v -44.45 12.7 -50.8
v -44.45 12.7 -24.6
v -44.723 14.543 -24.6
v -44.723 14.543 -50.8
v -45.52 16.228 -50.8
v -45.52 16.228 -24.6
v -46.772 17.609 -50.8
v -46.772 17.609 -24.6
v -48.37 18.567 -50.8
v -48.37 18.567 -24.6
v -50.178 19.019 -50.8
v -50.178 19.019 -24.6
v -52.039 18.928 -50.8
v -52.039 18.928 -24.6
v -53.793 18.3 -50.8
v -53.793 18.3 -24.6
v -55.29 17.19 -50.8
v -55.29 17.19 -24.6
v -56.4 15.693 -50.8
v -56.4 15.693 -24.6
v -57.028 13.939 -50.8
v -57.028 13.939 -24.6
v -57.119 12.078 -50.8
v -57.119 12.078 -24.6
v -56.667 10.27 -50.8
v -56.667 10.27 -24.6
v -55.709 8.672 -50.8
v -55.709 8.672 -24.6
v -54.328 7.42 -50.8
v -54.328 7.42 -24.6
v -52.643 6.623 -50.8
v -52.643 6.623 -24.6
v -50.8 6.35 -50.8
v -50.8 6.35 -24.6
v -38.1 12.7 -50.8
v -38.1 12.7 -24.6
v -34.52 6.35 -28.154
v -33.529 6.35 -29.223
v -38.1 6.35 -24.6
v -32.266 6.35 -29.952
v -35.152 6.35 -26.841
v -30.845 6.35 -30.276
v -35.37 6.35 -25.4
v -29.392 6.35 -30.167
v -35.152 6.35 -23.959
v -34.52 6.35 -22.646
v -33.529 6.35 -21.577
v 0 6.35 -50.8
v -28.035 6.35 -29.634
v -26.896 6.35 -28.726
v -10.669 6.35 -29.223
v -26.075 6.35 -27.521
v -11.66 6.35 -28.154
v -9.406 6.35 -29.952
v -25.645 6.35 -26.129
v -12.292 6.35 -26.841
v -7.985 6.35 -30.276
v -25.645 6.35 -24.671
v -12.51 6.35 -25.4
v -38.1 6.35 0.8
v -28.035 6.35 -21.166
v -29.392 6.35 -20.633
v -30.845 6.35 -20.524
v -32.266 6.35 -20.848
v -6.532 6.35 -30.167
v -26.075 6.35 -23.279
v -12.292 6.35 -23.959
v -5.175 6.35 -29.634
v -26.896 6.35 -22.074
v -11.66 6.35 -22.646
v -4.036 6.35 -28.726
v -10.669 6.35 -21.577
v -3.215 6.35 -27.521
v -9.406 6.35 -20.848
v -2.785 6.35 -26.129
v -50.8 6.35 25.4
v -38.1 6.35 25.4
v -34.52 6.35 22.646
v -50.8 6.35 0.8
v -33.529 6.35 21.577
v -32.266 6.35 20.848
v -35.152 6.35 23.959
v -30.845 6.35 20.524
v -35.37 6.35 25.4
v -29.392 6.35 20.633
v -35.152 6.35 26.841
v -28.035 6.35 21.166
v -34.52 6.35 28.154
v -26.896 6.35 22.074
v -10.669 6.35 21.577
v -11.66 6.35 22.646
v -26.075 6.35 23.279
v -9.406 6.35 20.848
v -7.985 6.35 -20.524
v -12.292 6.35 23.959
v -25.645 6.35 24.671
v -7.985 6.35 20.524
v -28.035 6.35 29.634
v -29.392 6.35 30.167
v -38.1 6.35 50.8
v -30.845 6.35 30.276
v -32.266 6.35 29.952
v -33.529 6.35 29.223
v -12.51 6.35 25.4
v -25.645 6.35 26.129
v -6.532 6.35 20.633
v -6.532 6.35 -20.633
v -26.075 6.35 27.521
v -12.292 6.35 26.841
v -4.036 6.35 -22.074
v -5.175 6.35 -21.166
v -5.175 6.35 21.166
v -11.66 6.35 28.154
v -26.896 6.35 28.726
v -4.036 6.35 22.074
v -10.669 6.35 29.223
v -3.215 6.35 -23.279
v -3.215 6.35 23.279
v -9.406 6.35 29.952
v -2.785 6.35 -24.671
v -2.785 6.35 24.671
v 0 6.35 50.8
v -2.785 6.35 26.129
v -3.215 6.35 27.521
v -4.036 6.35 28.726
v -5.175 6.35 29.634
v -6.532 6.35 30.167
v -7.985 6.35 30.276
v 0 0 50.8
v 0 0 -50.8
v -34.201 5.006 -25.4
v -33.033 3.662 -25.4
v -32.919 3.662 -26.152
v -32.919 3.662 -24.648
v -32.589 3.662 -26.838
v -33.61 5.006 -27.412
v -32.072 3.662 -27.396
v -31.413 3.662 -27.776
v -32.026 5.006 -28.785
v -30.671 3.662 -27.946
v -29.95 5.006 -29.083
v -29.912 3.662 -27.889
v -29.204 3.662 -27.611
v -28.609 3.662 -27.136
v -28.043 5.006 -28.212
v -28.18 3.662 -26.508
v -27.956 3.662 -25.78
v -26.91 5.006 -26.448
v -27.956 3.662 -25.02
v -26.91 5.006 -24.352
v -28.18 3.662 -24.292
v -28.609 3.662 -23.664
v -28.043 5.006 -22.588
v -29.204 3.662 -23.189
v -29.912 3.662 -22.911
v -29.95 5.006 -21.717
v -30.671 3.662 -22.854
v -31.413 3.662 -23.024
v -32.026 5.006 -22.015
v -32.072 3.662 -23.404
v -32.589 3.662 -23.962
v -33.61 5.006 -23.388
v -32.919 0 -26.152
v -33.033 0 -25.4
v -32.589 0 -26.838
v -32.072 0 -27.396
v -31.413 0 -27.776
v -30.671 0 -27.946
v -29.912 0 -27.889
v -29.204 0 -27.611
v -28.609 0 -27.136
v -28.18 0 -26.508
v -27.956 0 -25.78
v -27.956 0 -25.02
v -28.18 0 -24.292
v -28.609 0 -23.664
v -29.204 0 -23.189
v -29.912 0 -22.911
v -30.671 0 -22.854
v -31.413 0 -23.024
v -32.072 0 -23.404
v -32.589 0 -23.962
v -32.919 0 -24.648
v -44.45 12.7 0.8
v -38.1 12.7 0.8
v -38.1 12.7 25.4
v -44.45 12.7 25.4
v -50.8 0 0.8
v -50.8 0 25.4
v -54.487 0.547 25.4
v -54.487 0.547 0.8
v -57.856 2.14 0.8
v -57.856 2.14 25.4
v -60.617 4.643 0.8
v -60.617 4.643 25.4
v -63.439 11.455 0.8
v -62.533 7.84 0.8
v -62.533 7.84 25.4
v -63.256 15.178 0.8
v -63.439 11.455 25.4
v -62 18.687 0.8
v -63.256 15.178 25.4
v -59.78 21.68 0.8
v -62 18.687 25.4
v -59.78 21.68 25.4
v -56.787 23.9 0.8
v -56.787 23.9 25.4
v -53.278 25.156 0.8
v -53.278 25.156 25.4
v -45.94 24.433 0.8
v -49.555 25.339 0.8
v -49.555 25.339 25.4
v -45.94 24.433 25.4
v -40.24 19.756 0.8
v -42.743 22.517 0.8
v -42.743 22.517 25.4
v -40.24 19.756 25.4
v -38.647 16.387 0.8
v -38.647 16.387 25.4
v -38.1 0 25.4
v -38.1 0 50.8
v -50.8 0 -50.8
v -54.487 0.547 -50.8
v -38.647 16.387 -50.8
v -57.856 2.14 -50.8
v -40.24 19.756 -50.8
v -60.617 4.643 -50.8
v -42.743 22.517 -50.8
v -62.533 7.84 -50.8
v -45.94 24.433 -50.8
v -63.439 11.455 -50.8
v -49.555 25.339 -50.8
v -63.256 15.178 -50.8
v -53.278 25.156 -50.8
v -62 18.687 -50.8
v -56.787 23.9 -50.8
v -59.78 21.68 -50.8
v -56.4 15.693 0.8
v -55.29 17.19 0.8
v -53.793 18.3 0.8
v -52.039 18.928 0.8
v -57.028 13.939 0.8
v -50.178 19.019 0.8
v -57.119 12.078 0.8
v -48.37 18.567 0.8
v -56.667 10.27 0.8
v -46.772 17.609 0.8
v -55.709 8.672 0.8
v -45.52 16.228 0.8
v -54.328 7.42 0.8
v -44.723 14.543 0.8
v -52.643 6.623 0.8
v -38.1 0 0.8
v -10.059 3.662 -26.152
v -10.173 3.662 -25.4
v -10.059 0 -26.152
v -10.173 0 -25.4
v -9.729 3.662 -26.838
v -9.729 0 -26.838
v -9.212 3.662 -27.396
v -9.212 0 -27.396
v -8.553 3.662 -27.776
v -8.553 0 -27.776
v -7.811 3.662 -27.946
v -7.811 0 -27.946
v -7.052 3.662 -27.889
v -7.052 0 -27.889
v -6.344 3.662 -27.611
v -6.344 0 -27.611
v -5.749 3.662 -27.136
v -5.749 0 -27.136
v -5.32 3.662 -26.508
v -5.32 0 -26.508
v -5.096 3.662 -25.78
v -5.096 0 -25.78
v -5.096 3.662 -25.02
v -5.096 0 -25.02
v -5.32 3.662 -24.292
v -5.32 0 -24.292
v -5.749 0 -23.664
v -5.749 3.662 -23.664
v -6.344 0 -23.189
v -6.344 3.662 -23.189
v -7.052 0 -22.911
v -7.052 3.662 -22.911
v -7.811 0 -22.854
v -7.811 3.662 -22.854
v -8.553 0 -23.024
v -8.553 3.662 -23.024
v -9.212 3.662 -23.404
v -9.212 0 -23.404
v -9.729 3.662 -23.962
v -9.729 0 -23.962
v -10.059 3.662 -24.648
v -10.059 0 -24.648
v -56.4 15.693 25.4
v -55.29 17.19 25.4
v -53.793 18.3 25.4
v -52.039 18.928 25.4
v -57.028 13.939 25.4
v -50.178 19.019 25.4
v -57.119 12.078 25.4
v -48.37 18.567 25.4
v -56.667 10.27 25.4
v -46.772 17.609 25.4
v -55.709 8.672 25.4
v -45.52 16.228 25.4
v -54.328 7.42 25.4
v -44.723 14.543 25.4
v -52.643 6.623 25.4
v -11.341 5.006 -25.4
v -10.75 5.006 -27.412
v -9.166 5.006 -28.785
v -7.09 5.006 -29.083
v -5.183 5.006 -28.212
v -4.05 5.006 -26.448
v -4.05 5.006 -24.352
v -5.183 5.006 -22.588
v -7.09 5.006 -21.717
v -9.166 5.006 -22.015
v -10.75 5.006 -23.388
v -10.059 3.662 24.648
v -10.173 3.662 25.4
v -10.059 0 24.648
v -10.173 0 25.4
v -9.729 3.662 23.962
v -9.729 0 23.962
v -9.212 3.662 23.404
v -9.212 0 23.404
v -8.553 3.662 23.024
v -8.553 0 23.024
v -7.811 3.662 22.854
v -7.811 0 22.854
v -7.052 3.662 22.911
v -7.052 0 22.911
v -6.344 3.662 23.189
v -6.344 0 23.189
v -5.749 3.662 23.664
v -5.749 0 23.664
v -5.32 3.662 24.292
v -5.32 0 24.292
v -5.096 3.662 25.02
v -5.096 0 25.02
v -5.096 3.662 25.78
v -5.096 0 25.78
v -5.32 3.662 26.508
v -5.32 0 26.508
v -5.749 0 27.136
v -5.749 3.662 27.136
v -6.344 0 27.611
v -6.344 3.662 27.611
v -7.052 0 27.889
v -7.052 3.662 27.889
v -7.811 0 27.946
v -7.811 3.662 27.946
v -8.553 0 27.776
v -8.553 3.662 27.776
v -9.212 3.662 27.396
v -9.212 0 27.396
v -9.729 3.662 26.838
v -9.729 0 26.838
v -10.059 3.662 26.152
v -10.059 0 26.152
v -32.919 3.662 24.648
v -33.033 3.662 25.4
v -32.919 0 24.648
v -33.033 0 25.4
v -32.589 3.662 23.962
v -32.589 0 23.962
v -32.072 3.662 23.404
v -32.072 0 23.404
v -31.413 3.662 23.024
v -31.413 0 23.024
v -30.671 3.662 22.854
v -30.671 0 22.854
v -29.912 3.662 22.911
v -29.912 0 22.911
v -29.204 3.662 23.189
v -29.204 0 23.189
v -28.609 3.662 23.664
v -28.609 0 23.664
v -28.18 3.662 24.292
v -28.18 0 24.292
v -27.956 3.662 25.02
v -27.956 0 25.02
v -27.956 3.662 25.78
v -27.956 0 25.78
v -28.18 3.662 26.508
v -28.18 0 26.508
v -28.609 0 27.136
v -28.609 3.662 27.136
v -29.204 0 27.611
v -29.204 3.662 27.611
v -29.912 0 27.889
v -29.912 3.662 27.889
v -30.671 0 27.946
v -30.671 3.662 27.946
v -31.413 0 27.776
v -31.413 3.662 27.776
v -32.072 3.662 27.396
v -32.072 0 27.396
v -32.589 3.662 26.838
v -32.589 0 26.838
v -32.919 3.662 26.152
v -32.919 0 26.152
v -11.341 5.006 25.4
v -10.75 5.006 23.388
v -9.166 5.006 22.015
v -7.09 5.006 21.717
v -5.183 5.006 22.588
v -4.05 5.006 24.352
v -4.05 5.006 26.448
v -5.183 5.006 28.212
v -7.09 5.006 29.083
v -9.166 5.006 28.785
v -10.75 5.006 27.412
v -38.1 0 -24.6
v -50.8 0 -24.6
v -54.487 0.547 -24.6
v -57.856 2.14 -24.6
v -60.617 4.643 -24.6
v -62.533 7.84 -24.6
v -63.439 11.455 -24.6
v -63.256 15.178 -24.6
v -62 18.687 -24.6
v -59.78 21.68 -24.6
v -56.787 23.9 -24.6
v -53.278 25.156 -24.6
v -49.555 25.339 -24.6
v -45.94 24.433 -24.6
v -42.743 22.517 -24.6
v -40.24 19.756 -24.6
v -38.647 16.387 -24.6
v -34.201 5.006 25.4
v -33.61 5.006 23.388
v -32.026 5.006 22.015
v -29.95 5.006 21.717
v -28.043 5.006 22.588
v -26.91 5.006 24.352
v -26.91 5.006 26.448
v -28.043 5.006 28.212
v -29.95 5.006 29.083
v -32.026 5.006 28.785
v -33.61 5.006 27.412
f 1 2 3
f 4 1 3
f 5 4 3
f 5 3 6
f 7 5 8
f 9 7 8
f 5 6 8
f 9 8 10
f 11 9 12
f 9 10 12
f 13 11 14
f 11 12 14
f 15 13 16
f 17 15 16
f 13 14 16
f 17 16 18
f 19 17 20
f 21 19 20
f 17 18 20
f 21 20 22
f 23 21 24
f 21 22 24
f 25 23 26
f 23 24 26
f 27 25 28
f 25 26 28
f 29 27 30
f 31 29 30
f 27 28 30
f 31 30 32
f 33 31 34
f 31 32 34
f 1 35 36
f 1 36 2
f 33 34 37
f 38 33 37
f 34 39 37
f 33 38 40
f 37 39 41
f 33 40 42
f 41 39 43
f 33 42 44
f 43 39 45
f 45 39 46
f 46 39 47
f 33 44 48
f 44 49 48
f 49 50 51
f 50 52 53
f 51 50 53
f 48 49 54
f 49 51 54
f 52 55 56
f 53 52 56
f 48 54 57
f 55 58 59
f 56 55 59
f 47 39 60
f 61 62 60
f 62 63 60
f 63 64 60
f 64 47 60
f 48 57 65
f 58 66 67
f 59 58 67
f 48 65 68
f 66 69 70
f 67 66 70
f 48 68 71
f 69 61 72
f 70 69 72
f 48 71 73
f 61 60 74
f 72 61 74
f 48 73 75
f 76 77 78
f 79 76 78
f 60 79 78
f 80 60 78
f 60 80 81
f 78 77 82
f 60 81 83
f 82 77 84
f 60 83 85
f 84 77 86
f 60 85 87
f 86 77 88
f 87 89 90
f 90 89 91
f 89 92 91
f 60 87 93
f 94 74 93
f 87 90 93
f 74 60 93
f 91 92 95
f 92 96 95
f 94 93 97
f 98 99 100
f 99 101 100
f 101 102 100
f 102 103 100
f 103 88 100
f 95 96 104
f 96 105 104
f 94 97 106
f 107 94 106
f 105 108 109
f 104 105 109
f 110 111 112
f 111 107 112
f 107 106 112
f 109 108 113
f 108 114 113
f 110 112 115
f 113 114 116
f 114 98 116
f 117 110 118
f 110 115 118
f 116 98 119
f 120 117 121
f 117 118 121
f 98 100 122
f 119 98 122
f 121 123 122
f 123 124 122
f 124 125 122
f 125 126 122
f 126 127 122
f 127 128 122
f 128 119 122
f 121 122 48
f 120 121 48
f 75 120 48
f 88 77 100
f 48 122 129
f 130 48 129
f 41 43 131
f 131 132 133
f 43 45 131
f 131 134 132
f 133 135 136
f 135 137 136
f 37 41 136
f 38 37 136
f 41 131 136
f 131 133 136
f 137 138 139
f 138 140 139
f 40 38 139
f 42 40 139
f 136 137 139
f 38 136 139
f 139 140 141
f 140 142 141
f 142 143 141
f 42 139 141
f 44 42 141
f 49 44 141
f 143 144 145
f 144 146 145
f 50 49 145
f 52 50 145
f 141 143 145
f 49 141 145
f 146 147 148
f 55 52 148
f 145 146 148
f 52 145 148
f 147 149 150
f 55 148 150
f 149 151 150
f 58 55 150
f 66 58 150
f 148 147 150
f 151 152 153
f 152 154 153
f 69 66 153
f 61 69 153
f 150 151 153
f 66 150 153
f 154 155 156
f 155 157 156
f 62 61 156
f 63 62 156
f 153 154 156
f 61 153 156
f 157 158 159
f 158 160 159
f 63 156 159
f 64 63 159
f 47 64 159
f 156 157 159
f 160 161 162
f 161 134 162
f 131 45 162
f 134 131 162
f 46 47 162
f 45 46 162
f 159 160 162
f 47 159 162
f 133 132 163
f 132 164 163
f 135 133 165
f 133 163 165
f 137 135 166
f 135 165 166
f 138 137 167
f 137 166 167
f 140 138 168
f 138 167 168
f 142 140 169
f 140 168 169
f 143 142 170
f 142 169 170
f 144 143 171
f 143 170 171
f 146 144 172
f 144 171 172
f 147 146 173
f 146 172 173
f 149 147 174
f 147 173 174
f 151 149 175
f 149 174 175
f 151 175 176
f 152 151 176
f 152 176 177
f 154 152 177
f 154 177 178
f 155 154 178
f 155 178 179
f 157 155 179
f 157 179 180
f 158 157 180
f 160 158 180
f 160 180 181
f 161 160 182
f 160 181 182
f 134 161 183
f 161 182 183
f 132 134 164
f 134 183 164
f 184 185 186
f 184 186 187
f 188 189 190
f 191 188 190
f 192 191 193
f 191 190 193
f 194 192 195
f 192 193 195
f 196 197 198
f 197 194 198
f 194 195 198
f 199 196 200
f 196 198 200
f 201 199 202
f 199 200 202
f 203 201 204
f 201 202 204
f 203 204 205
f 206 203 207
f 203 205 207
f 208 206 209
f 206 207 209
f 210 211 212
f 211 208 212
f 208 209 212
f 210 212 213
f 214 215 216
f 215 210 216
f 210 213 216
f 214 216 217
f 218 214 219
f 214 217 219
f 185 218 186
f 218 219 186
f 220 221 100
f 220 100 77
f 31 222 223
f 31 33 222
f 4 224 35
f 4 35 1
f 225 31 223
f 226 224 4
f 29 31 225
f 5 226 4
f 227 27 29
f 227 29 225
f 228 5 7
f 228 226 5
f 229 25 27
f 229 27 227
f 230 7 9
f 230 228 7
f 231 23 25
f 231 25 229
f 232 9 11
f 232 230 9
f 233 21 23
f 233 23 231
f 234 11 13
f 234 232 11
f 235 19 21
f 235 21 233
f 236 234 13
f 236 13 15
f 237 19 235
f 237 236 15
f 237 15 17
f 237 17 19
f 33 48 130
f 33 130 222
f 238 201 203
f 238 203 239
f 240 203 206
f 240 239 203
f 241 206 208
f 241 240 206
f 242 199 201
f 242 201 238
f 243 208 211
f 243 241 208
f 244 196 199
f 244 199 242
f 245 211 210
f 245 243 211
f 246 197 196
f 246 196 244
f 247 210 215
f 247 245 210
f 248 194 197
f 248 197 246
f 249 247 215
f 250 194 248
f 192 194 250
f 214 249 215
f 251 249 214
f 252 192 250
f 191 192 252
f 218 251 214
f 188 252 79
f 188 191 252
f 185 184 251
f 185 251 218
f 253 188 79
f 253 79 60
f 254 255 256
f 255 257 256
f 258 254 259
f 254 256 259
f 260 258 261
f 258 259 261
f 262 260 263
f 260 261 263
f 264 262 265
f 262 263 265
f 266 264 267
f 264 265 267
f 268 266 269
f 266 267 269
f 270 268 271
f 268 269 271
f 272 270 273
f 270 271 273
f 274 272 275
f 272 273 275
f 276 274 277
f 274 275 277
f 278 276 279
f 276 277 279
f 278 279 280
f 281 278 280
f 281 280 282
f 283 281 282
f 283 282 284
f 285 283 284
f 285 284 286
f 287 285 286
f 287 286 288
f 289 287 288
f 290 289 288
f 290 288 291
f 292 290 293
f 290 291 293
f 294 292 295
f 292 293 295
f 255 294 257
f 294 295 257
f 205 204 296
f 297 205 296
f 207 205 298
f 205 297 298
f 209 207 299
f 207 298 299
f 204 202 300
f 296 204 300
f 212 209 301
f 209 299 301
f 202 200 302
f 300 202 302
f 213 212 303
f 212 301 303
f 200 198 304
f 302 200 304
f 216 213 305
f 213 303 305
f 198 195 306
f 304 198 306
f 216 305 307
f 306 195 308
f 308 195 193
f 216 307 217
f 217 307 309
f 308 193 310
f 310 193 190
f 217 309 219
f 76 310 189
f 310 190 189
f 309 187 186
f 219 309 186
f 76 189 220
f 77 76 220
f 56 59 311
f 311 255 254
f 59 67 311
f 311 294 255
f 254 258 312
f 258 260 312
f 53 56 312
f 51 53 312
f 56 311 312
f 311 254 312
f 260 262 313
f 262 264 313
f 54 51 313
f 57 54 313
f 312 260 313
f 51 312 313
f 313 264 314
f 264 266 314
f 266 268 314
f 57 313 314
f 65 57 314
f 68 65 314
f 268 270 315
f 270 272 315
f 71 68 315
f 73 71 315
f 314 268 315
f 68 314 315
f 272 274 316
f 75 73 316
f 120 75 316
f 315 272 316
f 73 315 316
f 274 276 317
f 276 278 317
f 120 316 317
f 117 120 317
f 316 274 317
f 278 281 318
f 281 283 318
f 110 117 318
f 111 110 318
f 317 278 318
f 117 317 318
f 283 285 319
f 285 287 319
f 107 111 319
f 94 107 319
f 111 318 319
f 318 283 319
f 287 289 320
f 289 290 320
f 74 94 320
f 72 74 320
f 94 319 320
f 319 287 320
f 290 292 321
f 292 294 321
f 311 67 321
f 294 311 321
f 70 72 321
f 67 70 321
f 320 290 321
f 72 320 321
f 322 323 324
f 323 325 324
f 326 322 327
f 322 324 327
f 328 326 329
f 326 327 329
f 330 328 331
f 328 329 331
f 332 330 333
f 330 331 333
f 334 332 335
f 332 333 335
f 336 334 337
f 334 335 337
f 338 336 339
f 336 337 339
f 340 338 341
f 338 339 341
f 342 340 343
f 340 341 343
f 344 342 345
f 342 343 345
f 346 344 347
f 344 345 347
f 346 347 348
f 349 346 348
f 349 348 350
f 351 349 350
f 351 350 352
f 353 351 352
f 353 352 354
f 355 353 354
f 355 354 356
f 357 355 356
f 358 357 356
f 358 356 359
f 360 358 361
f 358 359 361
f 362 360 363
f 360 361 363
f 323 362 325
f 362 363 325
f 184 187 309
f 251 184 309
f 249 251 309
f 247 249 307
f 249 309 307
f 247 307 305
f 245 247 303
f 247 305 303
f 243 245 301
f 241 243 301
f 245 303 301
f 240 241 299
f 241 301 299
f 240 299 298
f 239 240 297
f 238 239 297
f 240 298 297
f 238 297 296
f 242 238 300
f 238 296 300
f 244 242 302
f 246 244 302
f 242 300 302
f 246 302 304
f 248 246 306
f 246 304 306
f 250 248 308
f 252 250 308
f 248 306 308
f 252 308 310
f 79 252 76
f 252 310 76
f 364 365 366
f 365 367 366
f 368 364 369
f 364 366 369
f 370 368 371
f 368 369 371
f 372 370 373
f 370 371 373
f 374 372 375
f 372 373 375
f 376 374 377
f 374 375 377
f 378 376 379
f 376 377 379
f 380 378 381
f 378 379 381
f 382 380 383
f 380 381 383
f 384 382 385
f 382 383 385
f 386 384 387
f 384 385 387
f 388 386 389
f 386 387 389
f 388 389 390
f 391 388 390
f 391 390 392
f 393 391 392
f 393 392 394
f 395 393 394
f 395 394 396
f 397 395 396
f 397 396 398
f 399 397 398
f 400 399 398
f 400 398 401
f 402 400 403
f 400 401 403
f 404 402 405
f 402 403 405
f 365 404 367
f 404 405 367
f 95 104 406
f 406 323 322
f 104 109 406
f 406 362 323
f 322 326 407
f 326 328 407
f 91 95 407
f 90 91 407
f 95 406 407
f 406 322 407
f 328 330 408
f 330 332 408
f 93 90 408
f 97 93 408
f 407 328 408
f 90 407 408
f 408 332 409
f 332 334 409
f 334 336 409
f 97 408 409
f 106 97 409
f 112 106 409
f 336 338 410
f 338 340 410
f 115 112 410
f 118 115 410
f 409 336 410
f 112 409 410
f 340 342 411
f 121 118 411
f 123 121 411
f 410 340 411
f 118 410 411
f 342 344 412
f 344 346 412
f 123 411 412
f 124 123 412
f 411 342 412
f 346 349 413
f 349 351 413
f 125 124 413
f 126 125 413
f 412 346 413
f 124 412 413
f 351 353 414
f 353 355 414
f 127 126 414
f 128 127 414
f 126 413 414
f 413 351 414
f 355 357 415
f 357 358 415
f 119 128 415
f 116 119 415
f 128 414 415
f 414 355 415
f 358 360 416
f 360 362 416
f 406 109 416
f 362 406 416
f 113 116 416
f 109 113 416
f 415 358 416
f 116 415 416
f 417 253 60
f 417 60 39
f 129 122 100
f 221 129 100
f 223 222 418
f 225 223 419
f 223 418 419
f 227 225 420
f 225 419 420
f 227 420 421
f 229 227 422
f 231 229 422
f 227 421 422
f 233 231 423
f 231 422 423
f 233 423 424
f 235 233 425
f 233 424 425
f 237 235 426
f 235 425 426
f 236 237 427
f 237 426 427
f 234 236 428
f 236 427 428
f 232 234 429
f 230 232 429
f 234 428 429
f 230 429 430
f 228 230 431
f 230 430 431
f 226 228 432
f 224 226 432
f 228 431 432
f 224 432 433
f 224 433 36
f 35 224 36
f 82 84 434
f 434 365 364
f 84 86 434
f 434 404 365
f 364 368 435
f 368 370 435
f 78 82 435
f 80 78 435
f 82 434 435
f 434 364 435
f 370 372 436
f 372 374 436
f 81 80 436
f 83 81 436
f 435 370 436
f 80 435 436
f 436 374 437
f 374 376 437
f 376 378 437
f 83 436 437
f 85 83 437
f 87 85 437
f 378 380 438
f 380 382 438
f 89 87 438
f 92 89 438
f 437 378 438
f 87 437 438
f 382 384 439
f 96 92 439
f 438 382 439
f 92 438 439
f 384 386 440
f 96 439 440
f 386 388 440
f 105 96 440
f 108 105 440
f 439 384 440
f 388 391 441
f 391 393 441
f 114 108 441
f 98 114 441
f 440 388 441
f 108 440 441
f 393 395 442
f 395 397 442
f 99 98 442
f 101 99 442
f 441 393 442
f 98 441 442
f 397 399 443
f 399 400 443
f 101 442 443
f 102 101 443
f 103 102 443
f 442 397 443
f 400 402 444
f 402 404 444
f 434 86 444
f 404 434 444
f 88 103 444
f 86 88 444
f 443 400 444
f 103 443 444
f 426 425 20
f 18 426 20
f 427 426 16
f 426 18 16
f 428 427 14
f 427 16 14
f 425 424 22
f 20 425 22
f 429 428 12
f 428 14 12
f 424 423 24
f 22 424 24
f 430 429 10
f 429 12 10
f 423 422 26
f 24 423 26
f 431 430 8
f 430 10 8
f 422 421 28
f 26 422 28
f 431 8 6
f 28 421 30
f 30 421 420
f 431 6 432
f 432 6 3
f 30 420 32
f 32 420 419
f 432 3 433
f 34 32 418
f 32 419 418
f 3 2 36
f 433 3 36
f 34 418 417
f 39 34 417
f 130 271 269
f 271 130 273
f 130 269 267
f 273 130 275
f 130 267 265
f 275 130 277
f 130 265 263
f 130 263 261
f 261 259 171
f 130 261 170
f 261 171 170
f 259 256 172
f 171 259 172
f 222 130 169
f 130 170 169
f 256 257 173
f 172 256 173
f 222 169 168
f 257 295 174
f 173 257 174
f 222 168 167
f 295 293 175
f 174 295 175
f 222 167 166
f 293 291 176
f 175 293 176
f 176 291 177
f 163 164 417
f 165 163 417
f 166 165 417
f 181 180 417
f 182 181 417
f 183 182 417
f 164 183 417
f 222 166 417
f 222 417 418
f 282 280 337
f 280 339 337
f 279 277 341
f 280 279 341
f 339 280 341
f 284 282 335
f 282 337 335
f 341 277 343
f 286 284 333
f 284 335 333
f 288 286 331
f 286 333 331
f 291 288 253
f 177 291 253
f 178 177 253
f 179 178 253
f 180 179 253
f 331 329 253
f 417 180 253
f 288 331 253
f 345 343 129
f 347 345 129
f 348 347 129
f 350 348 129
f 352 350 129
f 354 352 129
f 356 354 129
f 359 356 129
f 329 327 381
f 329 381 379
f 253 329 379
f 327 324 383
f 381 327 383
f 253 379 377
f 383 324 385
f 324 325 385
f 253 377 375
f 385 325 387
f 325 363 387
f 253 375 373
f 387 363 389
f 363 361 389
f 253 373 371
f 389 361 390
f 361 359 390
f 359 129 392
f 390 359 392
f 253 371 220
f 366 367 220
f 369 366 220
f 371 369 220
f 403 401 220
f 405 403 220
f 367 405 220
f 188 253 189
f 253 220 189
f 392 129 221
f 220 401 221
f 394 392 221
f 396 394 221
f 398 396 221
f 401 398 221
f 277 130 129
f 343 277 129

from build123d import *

# Parameters (mm, degrees)
EXTRUDE_THIN1_DEPTH                             = 50.8
CUT_EXTRUDE2_START                              = -7.35
SKETCH3_W                                       = 25.4
SKETCH3_H                                       = 25.4
CUT_EXTRUDE2_DEPTH                              = 27.4
LPATTERN1_COUNT                                 = 2
LPATTERN1_PITCH                                 = 50
CSK_FOR_10_FLAT_HEAD_MACHINE_SCREW1_D           = 5.1054
CSK_FOR_10_FLAT_HEAD_MACHINE_SCREW1_CSINK_D     = 9.779
CSK_FOR_10_FLAT_HEAD_MACHINE_SCREW1_CSINK_ANGLE = 82
LPATTERN2_COUNT                                 = 2
LPATTERN2_PITCH                                 = 50.8
LPATTERN2_COUNT_DIR2                            = 2
LPATTERN2_PITCH_DIR2                            = 22.86


with BuildPart() as part:
    # Sketch1 → Extrude-Thin1 (new body, symmetric)
    with BuildSketch(Plane.XY):
        with BuildLine():
            Line((0, 0), (-50.8, 0))
            ThreePointArc((-50.8, 0), (-59.780256121, 21.680256121), (-38.1, 12.7))
            Line((-38.1, 12.7), (-44.45, 12.7))
            ThreePointArc((-44.45, 12.7), (-55.290128061, 17.190128061), (-50.8, 6.35))
            Line((-50.8, 6.35), (0, 6.35))
            Line((0, 6.35), (0, 0))
        make_face()
    extrude(amount=EXTRUDE_THIN1_DEPTH, both=True)

    # Sketch3 → Cut-Extrude2 (cut)
    with BuildSketch(Plane(origin=(0, 6.35, 0), x_dir=(1, 0, 0), z_dir=(0, 1, 0)).offset(CUT_EXTRUDE2_START)):
        with Locations((-50.8, -38.1)):
            Rectangle(SKETCH3_W, SKETCH3_H)
    cut_extrude2 = extrude(amount=CUT_EXTRUDE2_DEPTH, mode=Mode.SUBTRACT)

    # LPattern1: Cut-Extrude2 ×2
    with Locations(*[(0, 0, -i * LPATTERN1_PITCH) for i in range(1, LPATTERN1_COUNT)]):
        add(cut_extrude2, mode=Mode.SUBTRACT)

    # CSK for #10 Flat Head Machine Screw1 (through all)
    with Locations(Plane(origin=(0, 6.35, 0), x_dir=(1, 0, 0), z_dir=(0, 1, 0))):
        with Locations((-30.48, 25.4)):
            csk_for_10_flat_head_machine_screw1 = CounterSinkHole(CSK_FOR_10_FLAT_HEAD_MACHINE_SCREW1_D / 2, CSK_FOR_10_FLAT_HEAD_MACHINE_SCREW1_CSINK_D / 2, counter_sink_angle=CSK_FOR_10_FLAT_HEAD_MACHINE_SCREW1_CSINK_ANGLE)

    # LPattern2: CSK for _10 Flat Head Machine Screw1 2 × 2
    with Locations(*[(j * LPATTERN2_PITCH_DIR2, 0, i * LPATTERN2_PITCH) for i in range(LPATTERN2_COUNT) for j in range(LPATTERN2_COUNT_DIR2) if (i, j) != (0, 0)]):
        add(csk_for_10_flat_head_machine_screw1, mode=Mode.SUBTRACT)


solid = part.part
